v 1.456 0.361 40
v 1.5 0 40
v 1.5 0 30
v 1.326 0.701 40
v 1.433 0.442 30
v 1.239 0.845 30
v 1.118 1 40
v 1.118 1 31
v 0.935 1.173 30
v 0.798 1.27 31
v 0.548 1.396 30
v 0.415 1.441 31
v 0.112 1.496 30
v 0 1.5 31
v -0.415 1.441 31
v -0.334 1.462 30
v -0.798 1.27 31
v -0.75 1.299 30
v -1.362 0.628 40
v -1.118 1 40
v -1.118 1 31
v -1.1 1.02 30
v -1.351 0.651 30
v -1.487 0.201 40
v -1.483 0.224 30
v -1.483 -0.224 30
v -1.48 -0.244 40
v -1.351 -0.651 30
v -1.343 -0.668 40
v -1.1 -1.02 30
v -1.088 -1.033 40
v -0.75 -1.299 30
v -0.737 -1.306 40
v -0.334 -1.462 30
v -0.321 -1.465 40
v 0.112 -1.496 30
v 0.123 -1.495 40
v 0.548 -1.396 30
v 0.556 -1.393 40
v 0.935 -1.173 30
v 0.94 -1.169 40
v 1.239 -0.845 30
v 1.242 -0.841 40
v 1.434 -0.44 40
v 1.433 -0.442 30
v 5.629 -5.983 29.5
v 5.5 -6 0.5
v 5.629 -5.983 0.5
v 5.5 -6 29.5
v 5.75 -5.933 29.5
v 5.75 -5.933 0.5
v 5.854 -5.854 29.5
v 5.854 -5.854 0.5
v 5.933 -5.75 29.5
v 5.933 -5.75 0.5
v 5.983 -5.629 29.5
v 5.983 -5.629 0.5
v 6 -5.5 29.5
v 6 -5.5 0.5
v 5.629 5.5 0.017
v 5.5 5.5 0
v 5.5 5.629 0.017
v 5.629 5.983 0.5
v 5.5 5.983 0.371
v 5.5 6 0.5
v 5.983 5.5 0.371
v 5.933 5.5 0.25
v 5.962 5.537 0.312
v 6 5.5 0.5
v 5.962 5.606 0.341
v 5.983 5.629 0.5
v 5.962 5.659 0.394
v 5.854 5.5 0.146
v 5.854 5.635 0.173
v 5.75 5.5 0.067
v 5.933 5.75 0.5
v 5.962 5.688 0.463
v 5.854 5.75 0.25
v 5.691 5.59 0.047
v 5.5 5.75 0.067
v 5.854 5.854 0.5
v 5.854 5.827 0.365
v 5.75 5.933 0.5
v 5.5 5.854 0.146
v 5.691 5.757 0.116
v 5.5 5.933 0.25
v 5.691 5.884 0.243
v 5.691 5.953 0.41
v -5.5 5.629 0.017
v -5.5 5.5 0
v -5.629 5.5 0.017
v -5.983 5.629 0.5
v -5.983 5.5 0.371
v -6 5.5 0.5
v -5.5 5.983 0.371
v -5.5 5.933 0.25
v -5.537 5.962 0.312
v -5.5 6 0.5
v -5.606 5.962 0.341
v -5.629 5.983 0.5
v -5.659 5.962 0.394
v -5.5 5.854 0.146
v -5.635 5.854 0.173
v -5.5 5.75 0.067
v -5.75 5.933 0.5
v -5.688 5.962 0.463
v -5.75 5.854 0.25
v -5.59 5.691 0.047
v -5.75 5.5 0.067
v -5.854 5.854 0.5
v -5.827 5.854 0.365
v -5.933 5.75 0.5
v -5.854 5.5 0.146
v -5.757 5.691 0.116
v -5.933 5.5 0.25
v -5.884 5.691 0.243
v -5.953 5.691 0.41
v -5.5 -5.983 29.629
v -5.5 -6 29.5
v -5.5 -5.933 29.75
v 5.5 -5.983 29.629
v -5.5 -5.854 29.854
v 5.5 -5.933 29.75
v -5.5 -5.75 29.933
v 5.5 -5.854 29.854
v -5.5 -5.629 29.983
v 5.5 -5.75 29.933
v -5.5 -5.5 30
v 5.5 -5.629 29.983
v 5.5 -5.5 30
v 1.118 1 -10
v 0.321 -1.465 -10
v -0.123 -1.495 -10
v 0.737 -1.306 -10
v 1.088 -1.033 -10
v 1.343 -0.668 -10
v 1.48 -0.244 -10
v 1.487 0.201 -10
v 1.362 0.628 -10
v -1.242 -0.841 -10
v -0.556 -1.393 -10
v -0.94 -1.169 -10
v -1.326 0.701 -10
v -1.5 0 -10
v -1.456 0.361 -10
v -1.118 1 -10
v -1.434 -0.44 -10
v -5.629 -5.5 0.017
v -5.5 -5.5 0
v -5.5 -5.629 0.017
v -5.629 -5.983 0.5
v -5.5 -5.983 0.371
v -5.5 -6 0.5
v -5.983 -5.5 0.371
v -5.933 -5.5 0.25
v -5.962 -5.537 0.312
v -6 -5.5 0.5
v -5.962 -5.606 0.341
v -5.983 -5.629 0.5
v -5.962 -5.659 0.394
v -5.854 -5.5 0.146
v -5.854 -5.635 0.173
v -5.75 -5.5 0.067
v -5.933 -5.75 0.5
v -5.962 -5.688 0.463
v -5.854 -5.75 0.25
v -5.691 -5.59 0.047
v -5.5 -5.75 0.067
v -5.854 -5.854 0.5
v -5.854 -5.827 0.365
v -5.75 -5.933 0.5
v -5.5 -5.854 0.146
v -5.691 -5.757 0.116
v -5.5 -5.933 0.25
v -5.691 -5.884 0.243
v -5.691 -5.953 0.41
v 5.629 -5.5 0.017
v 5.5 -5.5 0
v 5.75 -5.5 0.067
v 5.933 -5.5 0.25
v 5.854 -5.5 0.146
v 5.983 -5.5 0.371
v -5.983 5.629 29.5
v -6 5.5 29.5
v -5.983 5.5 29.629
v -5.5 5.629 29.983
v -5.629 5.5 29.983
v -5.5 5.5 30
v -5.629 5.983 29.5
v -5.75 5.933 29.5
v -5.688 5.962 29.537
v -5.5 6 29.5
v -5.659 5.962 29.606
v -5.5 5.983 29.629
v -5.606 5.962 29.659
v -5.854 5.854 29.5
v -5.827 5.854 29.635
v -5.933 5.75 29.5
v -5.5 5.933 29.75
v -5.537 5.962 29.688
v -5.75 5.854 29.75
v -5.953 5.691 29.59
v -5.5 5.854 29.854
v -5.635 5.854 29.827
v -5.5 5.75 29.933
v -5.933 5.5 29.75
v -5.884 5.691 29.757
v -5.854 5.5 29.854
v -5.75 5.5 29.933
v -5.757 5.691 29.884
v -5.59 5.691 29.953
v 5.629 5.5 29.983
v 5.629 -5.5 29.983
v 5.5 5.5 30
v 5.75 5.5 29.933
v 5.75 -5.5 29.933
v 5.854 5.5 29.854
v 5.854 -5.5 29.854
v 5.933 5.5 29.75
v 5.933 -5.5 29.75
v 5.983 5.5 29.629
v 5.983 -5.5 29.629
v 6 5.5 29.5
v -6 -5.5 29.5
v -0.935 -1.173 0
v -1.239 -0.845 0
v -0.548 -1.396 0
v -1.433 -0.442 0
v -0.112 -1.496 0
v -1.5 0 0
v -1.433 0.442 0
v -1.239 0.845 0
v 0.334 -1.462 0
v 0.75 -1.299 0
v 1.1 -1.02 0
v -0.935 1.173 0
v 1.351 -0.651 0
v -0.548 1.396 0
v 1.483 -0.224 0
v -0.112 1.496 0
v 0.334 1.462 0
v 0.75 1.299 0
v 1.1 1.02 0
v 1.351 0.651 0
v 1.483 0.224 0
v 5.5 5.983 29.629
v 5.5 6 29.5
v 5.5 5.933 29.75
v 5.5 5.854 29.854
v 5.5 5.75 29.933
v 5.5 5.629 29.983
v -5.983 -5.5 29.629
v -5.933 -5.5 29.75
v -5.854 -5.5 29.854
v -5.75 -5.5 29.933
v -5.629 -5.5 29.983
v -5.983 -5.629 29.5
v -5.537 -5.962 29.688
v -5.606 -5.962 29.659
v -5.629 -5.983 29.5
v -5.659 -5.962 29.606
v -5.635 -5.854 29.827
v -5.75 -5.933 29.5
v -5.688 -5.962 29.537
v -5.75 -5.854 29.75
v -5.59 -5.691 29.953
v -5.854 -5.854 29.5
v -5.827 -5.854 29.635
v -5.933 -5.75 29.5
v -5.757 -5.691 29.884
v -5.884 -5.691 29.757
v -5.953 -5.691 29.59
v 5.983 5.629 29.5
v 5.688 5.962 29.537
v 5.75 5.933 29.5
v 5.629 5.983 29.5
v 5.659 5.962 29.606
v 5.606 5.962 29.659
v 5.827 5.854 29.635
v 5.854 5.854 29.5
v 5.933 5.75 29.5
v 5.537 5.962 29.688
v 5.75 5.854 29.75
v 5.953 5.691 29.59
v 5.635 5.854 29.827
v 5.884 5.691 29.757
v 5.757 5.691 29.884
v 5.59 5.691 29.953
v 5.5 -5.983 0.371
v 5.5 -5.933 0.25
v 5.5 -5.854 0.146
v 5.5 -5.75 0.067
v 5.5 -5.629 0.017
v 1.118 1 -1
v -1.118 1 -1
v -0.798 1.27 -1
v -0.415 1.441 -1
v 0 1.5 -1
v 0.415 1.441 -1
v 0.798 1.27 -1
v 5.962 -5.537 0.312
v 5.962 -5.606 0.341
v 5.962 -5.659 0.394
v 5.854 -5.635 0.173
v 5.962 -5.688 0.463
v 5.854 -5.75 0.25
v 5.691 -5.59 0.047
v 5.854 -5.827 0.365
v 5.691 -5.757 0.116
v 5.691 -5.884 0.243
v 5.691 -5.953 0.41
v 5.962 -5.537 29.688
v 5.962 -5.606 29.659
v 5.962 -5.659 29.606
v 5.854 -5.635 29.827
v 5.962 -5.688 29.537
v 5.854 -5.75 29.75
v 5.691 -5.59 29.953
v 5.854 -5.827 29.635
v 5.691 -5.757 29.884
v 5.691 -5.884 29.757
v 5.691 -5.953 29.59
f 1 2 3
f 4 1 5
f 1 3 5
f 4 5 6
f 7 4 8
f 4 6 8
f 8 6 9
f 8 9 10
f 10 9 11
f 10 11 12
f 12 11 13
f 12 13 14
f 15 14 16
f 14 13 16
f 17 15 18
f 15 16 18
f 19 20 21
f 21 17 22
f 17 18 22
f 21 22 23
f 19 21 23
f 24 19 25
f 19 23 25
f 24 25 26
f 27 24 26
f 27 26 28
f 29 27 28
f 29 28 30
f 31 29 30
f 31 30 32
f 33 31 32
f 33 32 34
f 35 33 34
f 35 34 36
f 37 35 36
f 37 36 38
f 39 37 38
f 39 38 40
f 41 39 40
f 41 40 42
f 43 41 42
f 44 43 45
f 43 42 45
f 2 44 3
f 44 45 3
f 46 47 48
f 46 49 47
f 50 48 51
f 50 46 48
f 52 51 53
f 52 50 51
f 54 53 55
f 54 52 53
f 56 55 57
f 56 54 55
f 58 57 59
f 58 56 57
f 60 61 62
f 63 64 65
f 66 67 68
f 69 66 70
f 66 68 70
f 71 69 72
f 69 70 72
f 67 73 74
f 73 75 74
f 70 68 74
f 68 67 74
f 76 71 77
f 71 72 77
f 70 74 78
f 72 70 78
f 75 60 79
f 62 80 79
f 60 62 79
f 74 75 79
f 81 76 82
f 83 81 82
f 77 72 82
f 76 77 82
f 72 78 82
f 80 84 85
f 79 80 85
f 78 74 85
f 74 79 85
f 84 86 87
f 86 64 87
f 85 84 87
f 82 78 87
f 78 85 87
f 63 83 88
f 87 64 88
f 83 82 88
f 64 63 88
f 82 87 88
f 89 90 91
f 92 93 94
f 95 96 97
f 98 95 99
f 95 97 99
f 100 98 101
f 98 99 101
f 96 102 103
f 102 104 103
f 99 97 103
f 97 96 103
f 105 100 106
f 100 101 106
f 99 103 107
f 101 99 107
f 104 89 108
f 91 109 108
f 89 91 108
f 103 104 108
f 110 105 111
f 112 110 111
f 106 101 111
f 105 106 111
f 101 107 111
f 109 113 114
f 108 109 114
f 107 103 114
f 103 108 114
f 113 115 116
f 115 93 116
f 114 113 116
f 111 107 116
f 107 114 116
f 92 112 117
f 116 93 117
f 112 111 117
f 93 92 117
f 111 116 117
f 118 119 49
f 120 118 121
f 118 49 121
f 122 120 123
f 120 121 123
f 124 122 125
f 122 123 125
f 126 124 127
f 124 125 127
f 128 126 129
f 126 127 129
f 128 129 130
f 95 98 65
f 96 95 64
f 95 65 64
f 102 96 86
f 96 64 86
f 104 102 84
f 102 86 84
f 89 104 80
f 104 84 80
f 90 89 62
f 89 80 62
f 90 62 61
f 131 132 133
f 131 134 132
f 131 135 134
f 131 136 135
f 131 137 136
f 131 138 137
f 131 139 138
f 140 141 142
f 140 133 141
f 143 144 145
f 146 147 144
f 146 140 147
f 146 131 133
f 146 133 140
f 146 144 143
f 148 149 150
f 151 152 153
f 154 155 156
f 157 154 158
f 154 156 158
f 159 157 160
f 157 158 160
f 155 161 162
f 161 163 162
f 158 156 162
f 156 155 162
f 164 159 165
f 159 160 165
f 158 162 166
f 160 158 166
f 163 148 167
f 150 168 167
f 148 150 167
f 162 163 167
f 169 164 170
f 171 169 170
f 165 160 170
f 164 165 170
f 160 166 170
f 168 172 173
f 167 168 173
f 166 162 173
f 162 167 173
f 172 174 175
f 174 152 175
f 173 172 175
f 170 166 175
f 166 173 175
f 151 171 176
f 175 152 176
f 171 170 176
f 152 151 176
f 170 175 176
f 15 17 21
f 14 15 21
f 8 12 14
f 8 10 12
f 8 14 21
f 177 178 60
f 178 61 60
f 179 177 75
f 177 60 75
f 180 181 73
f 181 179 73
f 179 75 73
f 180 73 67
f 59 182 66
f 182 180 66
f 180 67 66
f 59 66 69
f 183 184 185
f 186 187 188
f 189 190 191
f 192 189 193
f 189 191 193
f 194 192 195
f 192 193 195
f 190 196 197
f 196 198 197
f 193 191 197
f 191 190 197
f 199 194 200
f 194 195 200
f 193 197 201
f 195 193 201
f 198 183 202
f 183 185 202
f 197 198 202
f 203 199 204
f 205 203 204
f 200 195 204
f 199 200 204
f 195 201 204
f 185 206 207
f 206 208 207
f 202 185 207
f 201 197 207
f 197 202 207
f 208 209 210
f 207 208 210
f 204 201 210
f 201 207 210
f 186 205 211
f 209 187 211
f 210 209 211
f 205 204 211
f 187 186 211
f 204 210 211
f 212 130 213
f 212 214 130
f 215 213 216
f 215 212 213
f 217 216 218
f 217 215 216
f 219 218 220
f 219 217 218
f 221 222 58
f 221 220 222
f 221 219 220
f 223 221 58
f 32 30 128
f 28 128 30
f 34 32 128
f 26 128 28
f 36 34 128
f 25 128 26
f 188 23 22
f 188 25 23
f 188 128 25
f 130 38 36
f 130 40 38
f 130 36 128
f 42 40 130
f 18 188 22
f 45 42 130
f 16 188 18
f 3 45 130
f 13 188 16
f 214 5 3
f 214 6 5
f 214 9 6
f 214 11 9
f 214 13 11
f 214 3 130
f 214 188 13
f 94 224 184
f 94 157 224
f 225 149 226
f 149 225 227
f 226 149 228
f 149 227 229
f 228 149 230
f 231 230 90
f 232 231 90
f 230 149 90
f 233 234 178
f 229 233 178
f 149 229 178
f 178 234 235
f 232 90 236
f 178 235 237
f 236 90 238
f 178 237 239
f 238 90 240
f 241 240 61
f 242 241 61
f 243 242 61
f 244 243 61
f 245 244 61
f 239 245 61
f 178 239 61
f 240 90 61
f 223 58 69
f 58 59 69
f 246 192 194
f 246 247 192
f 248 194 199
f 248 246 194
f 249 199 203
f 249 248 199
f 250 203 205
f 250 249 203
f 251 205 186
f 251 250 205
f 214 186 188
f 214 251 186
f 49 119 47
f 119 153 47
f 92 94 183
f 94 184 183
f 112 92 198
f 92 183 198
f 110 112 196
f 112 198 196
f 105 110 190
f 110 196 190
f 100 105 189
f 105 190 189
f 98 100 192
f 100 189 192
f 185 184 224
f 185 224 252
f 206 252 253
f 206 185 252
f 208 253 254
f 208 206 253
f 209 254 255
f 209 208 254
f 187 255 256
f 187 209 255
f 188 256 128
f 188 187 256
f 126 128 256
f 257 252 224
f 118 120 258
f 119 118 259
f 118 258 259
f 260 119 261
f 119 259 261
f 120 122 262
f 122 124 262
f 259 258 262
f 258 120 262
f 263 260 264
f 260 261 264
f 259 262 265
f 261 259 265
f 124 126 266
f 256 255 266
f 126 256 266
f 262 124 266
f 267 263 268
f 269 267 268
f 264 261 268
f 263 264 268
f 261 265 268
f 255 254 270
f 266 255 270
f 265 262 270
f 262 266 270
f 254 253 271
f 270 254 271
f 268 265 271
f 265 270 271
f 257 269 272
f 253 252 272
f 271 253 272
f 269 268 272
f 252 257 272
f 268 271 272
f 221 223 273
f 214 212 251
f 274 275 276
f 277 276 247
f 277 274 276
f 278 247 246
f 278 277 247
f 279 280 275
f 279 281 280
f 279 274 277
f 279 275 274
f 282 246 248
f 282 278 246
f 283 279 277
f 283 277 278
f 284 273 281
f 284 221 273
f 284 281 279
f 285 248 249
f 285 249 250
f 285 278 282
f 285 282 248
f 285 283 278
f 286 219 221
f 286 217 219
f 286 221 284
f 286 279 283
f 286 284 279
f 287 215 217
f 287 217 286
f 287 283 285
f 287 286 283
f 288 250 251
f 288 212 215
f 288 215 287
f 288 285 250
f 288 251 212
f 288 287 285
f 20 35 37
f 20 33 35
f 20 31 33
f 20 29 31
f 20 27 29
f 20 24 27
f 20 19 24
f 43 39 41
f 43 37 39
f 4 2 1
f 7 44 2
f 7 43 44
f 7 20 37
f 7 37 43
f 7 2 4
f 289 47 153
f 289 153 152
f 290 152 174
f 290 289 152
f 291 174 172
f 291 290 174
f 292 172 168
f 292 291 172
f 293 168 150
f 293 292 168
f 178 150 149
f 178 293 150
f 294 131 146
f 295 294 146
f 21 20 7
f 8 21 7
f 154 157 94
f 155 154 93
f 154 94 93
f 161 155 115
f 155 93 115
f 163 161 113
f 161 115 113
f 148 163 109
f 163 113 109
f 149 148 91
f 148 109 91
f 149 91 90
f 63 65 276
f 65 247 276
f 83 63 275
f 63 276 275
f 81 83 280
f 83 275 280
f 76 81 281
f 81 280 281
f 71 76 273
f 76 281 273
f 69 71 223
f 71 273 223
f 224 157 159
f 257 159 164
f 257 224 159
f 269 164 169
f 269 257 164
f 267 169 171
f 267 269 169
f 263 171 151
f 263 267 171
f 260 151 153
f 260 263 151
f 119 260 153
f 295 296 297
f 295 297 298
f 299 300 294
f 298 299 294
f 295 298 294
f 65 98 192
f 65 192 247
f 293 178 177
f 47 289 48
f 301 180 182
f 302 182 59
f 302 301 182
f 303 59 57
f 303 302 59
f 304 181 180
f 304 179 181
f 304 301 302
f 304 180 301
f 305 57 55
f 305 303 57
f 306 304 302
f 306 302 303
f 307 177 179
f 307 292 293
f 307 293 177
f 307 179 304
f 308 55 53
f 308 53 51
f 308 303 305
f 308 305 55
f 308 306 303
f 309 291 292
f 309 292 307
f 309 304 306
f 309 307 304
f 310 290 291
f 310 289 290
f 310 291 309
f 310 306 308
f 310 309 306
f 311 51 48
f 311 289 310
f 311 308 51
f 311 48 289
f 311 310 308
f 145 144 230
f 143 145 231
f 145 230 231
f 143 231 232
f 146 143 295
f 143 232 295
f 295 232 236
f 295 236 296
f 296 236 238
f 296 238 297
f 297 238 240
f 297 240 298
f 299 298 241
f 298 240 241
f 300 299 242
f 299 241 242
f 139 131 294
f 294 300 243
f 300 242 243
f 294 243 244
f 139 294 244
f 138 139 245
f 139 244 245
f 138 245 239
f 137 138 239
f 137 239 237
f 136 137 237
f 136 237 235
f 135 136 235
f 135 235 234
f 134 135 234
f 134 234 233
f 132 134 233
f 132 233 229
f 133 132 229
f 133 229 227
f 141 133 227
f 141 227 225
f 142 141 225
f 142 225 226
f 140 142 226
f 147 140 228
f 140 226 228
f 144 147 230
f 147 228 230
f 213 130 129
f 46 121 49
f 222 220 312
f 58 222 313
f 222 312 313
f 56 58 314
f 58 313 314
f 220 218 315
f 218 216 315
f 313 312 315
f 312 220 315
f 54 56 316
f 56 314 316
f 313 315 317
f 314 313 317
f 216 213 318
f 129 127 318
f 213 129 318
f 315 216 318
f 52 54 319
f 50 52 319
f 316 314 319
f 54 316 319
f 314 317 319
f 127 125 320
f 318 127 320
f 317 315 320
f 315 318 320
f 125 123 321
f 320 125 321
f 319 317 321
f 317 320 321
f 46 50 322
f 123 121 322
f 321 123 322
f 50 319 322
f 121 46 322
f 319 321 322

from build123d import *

# Parameters (mm, degrees)
SKETCH_1_W               = 12
SKETCH_1_H               = 12
EXTRUDE_1_DEPTH          = 30
SKETCH_2_R               = 1.5
EXTRUDE_2_DEPTH          = 10
FILLET_1_R               = 0.5
CUT_EXTRUDE_1_DEPTH      = 1
CUT_EXTRUDE_1_DEPTH_BACK = 9
SKETCH_4_R               = 1.5
EXTRUDE_3_DEPTH          = 10
CUT_EXTRUDE_3_DEPTH      = 1
CUT_EXTRUDE_3_DEPTH_BACK = 9


with BuildPart() as part:
    # 草图1 → 凸台-拉伸1 (new body)
    with BuildSketch(Plane.XY):
        Rectangle(SKETCH_1_W, SKETCH_1_H)
    extrude(amount=EXTRUDE_1_DEPTH)

    # 草图2 → 凸台-拉伸2 (add)
    with BuildSketch(Plane.XY.offset(30)):
        Circle(SKETCH_2_R)
    extrude(amount=EXTRUDE_2_DEPTH)

    # 圆角1
    fillet_1_edges = [part.edges().sort_by_distance(p)[0] for p in [
        (-6, 0, 30),
        (0, -6, 30),
        (6, 0, 30),
        (0, -6, 0),
        (-6, 0, 0),
        (0, 6, 0),
        (6, 0, 0),
        (6, -6, 15),
        (-6, -6, 15),
        (-6, 6, 15),
        (6, 6, 15),
        (0, 6, 30),
    ]]
    fillet(fillet_1_edges, radius=FILLET_1_R)

    # 草图3 → 切除-拉伸1 (cut, two sides)
    with BuildSketch(Plane.XY.offset(40)) as cut_extrude_1_sk:
        Polygon((-31.084646908, 1), (-1.118033989, 1), (1.118033989, 1), (31.084646908, 1), (31.084646908, 60.933225838), (-31.084646908, 60.933225838), align=None)
    extrude(amount=CUT_EXTRUDE_1_DEPTH, mode=Mode.SUBTRACT)
    extrude(cut_extrude_1_sk.sketch, amount=-CUT_EXTRUDE_1_DEPTH_BACK, mode=Mode.SUBTRACT)

    # 草图4 → 凸台-拉伸3 (add)
    with BuildSketch(Plane(origin=(0, 0, 0), x_dir=(-1, 0, 0), z_dir=(0, 0, -1))):
        Circle(SKETCH_4_R)
    extrude(amount=EXTRUDE_3_DEPTH)

    # 草图5 → 切除-拉伸3 (cut, two sides)
    with BuildSketch(Plane(origin=(0, 0, -10), x_dir=(-1, 0, 0), z_dir=(0, 0, -1))) as cut_extrude_3_sk:
        Polygon((31.084646908, 1), (1.118033989, 1), (-1.118033989, 1), (-31.084646908, 1), (-31.084646908, 60.933225838), (31.084646908, 60.933225838), align=None)
    extrude(amount=CUT_EXTRUDE_3_DEPTH, mode=Mode.SUBTRACT)
    extrude(cut_extrude_3_sk.sketch, amount=-CUT_EXTRUDE_3_DEPTH_BACK, mode=Mode.SUBTRACT)


solid = part.part
